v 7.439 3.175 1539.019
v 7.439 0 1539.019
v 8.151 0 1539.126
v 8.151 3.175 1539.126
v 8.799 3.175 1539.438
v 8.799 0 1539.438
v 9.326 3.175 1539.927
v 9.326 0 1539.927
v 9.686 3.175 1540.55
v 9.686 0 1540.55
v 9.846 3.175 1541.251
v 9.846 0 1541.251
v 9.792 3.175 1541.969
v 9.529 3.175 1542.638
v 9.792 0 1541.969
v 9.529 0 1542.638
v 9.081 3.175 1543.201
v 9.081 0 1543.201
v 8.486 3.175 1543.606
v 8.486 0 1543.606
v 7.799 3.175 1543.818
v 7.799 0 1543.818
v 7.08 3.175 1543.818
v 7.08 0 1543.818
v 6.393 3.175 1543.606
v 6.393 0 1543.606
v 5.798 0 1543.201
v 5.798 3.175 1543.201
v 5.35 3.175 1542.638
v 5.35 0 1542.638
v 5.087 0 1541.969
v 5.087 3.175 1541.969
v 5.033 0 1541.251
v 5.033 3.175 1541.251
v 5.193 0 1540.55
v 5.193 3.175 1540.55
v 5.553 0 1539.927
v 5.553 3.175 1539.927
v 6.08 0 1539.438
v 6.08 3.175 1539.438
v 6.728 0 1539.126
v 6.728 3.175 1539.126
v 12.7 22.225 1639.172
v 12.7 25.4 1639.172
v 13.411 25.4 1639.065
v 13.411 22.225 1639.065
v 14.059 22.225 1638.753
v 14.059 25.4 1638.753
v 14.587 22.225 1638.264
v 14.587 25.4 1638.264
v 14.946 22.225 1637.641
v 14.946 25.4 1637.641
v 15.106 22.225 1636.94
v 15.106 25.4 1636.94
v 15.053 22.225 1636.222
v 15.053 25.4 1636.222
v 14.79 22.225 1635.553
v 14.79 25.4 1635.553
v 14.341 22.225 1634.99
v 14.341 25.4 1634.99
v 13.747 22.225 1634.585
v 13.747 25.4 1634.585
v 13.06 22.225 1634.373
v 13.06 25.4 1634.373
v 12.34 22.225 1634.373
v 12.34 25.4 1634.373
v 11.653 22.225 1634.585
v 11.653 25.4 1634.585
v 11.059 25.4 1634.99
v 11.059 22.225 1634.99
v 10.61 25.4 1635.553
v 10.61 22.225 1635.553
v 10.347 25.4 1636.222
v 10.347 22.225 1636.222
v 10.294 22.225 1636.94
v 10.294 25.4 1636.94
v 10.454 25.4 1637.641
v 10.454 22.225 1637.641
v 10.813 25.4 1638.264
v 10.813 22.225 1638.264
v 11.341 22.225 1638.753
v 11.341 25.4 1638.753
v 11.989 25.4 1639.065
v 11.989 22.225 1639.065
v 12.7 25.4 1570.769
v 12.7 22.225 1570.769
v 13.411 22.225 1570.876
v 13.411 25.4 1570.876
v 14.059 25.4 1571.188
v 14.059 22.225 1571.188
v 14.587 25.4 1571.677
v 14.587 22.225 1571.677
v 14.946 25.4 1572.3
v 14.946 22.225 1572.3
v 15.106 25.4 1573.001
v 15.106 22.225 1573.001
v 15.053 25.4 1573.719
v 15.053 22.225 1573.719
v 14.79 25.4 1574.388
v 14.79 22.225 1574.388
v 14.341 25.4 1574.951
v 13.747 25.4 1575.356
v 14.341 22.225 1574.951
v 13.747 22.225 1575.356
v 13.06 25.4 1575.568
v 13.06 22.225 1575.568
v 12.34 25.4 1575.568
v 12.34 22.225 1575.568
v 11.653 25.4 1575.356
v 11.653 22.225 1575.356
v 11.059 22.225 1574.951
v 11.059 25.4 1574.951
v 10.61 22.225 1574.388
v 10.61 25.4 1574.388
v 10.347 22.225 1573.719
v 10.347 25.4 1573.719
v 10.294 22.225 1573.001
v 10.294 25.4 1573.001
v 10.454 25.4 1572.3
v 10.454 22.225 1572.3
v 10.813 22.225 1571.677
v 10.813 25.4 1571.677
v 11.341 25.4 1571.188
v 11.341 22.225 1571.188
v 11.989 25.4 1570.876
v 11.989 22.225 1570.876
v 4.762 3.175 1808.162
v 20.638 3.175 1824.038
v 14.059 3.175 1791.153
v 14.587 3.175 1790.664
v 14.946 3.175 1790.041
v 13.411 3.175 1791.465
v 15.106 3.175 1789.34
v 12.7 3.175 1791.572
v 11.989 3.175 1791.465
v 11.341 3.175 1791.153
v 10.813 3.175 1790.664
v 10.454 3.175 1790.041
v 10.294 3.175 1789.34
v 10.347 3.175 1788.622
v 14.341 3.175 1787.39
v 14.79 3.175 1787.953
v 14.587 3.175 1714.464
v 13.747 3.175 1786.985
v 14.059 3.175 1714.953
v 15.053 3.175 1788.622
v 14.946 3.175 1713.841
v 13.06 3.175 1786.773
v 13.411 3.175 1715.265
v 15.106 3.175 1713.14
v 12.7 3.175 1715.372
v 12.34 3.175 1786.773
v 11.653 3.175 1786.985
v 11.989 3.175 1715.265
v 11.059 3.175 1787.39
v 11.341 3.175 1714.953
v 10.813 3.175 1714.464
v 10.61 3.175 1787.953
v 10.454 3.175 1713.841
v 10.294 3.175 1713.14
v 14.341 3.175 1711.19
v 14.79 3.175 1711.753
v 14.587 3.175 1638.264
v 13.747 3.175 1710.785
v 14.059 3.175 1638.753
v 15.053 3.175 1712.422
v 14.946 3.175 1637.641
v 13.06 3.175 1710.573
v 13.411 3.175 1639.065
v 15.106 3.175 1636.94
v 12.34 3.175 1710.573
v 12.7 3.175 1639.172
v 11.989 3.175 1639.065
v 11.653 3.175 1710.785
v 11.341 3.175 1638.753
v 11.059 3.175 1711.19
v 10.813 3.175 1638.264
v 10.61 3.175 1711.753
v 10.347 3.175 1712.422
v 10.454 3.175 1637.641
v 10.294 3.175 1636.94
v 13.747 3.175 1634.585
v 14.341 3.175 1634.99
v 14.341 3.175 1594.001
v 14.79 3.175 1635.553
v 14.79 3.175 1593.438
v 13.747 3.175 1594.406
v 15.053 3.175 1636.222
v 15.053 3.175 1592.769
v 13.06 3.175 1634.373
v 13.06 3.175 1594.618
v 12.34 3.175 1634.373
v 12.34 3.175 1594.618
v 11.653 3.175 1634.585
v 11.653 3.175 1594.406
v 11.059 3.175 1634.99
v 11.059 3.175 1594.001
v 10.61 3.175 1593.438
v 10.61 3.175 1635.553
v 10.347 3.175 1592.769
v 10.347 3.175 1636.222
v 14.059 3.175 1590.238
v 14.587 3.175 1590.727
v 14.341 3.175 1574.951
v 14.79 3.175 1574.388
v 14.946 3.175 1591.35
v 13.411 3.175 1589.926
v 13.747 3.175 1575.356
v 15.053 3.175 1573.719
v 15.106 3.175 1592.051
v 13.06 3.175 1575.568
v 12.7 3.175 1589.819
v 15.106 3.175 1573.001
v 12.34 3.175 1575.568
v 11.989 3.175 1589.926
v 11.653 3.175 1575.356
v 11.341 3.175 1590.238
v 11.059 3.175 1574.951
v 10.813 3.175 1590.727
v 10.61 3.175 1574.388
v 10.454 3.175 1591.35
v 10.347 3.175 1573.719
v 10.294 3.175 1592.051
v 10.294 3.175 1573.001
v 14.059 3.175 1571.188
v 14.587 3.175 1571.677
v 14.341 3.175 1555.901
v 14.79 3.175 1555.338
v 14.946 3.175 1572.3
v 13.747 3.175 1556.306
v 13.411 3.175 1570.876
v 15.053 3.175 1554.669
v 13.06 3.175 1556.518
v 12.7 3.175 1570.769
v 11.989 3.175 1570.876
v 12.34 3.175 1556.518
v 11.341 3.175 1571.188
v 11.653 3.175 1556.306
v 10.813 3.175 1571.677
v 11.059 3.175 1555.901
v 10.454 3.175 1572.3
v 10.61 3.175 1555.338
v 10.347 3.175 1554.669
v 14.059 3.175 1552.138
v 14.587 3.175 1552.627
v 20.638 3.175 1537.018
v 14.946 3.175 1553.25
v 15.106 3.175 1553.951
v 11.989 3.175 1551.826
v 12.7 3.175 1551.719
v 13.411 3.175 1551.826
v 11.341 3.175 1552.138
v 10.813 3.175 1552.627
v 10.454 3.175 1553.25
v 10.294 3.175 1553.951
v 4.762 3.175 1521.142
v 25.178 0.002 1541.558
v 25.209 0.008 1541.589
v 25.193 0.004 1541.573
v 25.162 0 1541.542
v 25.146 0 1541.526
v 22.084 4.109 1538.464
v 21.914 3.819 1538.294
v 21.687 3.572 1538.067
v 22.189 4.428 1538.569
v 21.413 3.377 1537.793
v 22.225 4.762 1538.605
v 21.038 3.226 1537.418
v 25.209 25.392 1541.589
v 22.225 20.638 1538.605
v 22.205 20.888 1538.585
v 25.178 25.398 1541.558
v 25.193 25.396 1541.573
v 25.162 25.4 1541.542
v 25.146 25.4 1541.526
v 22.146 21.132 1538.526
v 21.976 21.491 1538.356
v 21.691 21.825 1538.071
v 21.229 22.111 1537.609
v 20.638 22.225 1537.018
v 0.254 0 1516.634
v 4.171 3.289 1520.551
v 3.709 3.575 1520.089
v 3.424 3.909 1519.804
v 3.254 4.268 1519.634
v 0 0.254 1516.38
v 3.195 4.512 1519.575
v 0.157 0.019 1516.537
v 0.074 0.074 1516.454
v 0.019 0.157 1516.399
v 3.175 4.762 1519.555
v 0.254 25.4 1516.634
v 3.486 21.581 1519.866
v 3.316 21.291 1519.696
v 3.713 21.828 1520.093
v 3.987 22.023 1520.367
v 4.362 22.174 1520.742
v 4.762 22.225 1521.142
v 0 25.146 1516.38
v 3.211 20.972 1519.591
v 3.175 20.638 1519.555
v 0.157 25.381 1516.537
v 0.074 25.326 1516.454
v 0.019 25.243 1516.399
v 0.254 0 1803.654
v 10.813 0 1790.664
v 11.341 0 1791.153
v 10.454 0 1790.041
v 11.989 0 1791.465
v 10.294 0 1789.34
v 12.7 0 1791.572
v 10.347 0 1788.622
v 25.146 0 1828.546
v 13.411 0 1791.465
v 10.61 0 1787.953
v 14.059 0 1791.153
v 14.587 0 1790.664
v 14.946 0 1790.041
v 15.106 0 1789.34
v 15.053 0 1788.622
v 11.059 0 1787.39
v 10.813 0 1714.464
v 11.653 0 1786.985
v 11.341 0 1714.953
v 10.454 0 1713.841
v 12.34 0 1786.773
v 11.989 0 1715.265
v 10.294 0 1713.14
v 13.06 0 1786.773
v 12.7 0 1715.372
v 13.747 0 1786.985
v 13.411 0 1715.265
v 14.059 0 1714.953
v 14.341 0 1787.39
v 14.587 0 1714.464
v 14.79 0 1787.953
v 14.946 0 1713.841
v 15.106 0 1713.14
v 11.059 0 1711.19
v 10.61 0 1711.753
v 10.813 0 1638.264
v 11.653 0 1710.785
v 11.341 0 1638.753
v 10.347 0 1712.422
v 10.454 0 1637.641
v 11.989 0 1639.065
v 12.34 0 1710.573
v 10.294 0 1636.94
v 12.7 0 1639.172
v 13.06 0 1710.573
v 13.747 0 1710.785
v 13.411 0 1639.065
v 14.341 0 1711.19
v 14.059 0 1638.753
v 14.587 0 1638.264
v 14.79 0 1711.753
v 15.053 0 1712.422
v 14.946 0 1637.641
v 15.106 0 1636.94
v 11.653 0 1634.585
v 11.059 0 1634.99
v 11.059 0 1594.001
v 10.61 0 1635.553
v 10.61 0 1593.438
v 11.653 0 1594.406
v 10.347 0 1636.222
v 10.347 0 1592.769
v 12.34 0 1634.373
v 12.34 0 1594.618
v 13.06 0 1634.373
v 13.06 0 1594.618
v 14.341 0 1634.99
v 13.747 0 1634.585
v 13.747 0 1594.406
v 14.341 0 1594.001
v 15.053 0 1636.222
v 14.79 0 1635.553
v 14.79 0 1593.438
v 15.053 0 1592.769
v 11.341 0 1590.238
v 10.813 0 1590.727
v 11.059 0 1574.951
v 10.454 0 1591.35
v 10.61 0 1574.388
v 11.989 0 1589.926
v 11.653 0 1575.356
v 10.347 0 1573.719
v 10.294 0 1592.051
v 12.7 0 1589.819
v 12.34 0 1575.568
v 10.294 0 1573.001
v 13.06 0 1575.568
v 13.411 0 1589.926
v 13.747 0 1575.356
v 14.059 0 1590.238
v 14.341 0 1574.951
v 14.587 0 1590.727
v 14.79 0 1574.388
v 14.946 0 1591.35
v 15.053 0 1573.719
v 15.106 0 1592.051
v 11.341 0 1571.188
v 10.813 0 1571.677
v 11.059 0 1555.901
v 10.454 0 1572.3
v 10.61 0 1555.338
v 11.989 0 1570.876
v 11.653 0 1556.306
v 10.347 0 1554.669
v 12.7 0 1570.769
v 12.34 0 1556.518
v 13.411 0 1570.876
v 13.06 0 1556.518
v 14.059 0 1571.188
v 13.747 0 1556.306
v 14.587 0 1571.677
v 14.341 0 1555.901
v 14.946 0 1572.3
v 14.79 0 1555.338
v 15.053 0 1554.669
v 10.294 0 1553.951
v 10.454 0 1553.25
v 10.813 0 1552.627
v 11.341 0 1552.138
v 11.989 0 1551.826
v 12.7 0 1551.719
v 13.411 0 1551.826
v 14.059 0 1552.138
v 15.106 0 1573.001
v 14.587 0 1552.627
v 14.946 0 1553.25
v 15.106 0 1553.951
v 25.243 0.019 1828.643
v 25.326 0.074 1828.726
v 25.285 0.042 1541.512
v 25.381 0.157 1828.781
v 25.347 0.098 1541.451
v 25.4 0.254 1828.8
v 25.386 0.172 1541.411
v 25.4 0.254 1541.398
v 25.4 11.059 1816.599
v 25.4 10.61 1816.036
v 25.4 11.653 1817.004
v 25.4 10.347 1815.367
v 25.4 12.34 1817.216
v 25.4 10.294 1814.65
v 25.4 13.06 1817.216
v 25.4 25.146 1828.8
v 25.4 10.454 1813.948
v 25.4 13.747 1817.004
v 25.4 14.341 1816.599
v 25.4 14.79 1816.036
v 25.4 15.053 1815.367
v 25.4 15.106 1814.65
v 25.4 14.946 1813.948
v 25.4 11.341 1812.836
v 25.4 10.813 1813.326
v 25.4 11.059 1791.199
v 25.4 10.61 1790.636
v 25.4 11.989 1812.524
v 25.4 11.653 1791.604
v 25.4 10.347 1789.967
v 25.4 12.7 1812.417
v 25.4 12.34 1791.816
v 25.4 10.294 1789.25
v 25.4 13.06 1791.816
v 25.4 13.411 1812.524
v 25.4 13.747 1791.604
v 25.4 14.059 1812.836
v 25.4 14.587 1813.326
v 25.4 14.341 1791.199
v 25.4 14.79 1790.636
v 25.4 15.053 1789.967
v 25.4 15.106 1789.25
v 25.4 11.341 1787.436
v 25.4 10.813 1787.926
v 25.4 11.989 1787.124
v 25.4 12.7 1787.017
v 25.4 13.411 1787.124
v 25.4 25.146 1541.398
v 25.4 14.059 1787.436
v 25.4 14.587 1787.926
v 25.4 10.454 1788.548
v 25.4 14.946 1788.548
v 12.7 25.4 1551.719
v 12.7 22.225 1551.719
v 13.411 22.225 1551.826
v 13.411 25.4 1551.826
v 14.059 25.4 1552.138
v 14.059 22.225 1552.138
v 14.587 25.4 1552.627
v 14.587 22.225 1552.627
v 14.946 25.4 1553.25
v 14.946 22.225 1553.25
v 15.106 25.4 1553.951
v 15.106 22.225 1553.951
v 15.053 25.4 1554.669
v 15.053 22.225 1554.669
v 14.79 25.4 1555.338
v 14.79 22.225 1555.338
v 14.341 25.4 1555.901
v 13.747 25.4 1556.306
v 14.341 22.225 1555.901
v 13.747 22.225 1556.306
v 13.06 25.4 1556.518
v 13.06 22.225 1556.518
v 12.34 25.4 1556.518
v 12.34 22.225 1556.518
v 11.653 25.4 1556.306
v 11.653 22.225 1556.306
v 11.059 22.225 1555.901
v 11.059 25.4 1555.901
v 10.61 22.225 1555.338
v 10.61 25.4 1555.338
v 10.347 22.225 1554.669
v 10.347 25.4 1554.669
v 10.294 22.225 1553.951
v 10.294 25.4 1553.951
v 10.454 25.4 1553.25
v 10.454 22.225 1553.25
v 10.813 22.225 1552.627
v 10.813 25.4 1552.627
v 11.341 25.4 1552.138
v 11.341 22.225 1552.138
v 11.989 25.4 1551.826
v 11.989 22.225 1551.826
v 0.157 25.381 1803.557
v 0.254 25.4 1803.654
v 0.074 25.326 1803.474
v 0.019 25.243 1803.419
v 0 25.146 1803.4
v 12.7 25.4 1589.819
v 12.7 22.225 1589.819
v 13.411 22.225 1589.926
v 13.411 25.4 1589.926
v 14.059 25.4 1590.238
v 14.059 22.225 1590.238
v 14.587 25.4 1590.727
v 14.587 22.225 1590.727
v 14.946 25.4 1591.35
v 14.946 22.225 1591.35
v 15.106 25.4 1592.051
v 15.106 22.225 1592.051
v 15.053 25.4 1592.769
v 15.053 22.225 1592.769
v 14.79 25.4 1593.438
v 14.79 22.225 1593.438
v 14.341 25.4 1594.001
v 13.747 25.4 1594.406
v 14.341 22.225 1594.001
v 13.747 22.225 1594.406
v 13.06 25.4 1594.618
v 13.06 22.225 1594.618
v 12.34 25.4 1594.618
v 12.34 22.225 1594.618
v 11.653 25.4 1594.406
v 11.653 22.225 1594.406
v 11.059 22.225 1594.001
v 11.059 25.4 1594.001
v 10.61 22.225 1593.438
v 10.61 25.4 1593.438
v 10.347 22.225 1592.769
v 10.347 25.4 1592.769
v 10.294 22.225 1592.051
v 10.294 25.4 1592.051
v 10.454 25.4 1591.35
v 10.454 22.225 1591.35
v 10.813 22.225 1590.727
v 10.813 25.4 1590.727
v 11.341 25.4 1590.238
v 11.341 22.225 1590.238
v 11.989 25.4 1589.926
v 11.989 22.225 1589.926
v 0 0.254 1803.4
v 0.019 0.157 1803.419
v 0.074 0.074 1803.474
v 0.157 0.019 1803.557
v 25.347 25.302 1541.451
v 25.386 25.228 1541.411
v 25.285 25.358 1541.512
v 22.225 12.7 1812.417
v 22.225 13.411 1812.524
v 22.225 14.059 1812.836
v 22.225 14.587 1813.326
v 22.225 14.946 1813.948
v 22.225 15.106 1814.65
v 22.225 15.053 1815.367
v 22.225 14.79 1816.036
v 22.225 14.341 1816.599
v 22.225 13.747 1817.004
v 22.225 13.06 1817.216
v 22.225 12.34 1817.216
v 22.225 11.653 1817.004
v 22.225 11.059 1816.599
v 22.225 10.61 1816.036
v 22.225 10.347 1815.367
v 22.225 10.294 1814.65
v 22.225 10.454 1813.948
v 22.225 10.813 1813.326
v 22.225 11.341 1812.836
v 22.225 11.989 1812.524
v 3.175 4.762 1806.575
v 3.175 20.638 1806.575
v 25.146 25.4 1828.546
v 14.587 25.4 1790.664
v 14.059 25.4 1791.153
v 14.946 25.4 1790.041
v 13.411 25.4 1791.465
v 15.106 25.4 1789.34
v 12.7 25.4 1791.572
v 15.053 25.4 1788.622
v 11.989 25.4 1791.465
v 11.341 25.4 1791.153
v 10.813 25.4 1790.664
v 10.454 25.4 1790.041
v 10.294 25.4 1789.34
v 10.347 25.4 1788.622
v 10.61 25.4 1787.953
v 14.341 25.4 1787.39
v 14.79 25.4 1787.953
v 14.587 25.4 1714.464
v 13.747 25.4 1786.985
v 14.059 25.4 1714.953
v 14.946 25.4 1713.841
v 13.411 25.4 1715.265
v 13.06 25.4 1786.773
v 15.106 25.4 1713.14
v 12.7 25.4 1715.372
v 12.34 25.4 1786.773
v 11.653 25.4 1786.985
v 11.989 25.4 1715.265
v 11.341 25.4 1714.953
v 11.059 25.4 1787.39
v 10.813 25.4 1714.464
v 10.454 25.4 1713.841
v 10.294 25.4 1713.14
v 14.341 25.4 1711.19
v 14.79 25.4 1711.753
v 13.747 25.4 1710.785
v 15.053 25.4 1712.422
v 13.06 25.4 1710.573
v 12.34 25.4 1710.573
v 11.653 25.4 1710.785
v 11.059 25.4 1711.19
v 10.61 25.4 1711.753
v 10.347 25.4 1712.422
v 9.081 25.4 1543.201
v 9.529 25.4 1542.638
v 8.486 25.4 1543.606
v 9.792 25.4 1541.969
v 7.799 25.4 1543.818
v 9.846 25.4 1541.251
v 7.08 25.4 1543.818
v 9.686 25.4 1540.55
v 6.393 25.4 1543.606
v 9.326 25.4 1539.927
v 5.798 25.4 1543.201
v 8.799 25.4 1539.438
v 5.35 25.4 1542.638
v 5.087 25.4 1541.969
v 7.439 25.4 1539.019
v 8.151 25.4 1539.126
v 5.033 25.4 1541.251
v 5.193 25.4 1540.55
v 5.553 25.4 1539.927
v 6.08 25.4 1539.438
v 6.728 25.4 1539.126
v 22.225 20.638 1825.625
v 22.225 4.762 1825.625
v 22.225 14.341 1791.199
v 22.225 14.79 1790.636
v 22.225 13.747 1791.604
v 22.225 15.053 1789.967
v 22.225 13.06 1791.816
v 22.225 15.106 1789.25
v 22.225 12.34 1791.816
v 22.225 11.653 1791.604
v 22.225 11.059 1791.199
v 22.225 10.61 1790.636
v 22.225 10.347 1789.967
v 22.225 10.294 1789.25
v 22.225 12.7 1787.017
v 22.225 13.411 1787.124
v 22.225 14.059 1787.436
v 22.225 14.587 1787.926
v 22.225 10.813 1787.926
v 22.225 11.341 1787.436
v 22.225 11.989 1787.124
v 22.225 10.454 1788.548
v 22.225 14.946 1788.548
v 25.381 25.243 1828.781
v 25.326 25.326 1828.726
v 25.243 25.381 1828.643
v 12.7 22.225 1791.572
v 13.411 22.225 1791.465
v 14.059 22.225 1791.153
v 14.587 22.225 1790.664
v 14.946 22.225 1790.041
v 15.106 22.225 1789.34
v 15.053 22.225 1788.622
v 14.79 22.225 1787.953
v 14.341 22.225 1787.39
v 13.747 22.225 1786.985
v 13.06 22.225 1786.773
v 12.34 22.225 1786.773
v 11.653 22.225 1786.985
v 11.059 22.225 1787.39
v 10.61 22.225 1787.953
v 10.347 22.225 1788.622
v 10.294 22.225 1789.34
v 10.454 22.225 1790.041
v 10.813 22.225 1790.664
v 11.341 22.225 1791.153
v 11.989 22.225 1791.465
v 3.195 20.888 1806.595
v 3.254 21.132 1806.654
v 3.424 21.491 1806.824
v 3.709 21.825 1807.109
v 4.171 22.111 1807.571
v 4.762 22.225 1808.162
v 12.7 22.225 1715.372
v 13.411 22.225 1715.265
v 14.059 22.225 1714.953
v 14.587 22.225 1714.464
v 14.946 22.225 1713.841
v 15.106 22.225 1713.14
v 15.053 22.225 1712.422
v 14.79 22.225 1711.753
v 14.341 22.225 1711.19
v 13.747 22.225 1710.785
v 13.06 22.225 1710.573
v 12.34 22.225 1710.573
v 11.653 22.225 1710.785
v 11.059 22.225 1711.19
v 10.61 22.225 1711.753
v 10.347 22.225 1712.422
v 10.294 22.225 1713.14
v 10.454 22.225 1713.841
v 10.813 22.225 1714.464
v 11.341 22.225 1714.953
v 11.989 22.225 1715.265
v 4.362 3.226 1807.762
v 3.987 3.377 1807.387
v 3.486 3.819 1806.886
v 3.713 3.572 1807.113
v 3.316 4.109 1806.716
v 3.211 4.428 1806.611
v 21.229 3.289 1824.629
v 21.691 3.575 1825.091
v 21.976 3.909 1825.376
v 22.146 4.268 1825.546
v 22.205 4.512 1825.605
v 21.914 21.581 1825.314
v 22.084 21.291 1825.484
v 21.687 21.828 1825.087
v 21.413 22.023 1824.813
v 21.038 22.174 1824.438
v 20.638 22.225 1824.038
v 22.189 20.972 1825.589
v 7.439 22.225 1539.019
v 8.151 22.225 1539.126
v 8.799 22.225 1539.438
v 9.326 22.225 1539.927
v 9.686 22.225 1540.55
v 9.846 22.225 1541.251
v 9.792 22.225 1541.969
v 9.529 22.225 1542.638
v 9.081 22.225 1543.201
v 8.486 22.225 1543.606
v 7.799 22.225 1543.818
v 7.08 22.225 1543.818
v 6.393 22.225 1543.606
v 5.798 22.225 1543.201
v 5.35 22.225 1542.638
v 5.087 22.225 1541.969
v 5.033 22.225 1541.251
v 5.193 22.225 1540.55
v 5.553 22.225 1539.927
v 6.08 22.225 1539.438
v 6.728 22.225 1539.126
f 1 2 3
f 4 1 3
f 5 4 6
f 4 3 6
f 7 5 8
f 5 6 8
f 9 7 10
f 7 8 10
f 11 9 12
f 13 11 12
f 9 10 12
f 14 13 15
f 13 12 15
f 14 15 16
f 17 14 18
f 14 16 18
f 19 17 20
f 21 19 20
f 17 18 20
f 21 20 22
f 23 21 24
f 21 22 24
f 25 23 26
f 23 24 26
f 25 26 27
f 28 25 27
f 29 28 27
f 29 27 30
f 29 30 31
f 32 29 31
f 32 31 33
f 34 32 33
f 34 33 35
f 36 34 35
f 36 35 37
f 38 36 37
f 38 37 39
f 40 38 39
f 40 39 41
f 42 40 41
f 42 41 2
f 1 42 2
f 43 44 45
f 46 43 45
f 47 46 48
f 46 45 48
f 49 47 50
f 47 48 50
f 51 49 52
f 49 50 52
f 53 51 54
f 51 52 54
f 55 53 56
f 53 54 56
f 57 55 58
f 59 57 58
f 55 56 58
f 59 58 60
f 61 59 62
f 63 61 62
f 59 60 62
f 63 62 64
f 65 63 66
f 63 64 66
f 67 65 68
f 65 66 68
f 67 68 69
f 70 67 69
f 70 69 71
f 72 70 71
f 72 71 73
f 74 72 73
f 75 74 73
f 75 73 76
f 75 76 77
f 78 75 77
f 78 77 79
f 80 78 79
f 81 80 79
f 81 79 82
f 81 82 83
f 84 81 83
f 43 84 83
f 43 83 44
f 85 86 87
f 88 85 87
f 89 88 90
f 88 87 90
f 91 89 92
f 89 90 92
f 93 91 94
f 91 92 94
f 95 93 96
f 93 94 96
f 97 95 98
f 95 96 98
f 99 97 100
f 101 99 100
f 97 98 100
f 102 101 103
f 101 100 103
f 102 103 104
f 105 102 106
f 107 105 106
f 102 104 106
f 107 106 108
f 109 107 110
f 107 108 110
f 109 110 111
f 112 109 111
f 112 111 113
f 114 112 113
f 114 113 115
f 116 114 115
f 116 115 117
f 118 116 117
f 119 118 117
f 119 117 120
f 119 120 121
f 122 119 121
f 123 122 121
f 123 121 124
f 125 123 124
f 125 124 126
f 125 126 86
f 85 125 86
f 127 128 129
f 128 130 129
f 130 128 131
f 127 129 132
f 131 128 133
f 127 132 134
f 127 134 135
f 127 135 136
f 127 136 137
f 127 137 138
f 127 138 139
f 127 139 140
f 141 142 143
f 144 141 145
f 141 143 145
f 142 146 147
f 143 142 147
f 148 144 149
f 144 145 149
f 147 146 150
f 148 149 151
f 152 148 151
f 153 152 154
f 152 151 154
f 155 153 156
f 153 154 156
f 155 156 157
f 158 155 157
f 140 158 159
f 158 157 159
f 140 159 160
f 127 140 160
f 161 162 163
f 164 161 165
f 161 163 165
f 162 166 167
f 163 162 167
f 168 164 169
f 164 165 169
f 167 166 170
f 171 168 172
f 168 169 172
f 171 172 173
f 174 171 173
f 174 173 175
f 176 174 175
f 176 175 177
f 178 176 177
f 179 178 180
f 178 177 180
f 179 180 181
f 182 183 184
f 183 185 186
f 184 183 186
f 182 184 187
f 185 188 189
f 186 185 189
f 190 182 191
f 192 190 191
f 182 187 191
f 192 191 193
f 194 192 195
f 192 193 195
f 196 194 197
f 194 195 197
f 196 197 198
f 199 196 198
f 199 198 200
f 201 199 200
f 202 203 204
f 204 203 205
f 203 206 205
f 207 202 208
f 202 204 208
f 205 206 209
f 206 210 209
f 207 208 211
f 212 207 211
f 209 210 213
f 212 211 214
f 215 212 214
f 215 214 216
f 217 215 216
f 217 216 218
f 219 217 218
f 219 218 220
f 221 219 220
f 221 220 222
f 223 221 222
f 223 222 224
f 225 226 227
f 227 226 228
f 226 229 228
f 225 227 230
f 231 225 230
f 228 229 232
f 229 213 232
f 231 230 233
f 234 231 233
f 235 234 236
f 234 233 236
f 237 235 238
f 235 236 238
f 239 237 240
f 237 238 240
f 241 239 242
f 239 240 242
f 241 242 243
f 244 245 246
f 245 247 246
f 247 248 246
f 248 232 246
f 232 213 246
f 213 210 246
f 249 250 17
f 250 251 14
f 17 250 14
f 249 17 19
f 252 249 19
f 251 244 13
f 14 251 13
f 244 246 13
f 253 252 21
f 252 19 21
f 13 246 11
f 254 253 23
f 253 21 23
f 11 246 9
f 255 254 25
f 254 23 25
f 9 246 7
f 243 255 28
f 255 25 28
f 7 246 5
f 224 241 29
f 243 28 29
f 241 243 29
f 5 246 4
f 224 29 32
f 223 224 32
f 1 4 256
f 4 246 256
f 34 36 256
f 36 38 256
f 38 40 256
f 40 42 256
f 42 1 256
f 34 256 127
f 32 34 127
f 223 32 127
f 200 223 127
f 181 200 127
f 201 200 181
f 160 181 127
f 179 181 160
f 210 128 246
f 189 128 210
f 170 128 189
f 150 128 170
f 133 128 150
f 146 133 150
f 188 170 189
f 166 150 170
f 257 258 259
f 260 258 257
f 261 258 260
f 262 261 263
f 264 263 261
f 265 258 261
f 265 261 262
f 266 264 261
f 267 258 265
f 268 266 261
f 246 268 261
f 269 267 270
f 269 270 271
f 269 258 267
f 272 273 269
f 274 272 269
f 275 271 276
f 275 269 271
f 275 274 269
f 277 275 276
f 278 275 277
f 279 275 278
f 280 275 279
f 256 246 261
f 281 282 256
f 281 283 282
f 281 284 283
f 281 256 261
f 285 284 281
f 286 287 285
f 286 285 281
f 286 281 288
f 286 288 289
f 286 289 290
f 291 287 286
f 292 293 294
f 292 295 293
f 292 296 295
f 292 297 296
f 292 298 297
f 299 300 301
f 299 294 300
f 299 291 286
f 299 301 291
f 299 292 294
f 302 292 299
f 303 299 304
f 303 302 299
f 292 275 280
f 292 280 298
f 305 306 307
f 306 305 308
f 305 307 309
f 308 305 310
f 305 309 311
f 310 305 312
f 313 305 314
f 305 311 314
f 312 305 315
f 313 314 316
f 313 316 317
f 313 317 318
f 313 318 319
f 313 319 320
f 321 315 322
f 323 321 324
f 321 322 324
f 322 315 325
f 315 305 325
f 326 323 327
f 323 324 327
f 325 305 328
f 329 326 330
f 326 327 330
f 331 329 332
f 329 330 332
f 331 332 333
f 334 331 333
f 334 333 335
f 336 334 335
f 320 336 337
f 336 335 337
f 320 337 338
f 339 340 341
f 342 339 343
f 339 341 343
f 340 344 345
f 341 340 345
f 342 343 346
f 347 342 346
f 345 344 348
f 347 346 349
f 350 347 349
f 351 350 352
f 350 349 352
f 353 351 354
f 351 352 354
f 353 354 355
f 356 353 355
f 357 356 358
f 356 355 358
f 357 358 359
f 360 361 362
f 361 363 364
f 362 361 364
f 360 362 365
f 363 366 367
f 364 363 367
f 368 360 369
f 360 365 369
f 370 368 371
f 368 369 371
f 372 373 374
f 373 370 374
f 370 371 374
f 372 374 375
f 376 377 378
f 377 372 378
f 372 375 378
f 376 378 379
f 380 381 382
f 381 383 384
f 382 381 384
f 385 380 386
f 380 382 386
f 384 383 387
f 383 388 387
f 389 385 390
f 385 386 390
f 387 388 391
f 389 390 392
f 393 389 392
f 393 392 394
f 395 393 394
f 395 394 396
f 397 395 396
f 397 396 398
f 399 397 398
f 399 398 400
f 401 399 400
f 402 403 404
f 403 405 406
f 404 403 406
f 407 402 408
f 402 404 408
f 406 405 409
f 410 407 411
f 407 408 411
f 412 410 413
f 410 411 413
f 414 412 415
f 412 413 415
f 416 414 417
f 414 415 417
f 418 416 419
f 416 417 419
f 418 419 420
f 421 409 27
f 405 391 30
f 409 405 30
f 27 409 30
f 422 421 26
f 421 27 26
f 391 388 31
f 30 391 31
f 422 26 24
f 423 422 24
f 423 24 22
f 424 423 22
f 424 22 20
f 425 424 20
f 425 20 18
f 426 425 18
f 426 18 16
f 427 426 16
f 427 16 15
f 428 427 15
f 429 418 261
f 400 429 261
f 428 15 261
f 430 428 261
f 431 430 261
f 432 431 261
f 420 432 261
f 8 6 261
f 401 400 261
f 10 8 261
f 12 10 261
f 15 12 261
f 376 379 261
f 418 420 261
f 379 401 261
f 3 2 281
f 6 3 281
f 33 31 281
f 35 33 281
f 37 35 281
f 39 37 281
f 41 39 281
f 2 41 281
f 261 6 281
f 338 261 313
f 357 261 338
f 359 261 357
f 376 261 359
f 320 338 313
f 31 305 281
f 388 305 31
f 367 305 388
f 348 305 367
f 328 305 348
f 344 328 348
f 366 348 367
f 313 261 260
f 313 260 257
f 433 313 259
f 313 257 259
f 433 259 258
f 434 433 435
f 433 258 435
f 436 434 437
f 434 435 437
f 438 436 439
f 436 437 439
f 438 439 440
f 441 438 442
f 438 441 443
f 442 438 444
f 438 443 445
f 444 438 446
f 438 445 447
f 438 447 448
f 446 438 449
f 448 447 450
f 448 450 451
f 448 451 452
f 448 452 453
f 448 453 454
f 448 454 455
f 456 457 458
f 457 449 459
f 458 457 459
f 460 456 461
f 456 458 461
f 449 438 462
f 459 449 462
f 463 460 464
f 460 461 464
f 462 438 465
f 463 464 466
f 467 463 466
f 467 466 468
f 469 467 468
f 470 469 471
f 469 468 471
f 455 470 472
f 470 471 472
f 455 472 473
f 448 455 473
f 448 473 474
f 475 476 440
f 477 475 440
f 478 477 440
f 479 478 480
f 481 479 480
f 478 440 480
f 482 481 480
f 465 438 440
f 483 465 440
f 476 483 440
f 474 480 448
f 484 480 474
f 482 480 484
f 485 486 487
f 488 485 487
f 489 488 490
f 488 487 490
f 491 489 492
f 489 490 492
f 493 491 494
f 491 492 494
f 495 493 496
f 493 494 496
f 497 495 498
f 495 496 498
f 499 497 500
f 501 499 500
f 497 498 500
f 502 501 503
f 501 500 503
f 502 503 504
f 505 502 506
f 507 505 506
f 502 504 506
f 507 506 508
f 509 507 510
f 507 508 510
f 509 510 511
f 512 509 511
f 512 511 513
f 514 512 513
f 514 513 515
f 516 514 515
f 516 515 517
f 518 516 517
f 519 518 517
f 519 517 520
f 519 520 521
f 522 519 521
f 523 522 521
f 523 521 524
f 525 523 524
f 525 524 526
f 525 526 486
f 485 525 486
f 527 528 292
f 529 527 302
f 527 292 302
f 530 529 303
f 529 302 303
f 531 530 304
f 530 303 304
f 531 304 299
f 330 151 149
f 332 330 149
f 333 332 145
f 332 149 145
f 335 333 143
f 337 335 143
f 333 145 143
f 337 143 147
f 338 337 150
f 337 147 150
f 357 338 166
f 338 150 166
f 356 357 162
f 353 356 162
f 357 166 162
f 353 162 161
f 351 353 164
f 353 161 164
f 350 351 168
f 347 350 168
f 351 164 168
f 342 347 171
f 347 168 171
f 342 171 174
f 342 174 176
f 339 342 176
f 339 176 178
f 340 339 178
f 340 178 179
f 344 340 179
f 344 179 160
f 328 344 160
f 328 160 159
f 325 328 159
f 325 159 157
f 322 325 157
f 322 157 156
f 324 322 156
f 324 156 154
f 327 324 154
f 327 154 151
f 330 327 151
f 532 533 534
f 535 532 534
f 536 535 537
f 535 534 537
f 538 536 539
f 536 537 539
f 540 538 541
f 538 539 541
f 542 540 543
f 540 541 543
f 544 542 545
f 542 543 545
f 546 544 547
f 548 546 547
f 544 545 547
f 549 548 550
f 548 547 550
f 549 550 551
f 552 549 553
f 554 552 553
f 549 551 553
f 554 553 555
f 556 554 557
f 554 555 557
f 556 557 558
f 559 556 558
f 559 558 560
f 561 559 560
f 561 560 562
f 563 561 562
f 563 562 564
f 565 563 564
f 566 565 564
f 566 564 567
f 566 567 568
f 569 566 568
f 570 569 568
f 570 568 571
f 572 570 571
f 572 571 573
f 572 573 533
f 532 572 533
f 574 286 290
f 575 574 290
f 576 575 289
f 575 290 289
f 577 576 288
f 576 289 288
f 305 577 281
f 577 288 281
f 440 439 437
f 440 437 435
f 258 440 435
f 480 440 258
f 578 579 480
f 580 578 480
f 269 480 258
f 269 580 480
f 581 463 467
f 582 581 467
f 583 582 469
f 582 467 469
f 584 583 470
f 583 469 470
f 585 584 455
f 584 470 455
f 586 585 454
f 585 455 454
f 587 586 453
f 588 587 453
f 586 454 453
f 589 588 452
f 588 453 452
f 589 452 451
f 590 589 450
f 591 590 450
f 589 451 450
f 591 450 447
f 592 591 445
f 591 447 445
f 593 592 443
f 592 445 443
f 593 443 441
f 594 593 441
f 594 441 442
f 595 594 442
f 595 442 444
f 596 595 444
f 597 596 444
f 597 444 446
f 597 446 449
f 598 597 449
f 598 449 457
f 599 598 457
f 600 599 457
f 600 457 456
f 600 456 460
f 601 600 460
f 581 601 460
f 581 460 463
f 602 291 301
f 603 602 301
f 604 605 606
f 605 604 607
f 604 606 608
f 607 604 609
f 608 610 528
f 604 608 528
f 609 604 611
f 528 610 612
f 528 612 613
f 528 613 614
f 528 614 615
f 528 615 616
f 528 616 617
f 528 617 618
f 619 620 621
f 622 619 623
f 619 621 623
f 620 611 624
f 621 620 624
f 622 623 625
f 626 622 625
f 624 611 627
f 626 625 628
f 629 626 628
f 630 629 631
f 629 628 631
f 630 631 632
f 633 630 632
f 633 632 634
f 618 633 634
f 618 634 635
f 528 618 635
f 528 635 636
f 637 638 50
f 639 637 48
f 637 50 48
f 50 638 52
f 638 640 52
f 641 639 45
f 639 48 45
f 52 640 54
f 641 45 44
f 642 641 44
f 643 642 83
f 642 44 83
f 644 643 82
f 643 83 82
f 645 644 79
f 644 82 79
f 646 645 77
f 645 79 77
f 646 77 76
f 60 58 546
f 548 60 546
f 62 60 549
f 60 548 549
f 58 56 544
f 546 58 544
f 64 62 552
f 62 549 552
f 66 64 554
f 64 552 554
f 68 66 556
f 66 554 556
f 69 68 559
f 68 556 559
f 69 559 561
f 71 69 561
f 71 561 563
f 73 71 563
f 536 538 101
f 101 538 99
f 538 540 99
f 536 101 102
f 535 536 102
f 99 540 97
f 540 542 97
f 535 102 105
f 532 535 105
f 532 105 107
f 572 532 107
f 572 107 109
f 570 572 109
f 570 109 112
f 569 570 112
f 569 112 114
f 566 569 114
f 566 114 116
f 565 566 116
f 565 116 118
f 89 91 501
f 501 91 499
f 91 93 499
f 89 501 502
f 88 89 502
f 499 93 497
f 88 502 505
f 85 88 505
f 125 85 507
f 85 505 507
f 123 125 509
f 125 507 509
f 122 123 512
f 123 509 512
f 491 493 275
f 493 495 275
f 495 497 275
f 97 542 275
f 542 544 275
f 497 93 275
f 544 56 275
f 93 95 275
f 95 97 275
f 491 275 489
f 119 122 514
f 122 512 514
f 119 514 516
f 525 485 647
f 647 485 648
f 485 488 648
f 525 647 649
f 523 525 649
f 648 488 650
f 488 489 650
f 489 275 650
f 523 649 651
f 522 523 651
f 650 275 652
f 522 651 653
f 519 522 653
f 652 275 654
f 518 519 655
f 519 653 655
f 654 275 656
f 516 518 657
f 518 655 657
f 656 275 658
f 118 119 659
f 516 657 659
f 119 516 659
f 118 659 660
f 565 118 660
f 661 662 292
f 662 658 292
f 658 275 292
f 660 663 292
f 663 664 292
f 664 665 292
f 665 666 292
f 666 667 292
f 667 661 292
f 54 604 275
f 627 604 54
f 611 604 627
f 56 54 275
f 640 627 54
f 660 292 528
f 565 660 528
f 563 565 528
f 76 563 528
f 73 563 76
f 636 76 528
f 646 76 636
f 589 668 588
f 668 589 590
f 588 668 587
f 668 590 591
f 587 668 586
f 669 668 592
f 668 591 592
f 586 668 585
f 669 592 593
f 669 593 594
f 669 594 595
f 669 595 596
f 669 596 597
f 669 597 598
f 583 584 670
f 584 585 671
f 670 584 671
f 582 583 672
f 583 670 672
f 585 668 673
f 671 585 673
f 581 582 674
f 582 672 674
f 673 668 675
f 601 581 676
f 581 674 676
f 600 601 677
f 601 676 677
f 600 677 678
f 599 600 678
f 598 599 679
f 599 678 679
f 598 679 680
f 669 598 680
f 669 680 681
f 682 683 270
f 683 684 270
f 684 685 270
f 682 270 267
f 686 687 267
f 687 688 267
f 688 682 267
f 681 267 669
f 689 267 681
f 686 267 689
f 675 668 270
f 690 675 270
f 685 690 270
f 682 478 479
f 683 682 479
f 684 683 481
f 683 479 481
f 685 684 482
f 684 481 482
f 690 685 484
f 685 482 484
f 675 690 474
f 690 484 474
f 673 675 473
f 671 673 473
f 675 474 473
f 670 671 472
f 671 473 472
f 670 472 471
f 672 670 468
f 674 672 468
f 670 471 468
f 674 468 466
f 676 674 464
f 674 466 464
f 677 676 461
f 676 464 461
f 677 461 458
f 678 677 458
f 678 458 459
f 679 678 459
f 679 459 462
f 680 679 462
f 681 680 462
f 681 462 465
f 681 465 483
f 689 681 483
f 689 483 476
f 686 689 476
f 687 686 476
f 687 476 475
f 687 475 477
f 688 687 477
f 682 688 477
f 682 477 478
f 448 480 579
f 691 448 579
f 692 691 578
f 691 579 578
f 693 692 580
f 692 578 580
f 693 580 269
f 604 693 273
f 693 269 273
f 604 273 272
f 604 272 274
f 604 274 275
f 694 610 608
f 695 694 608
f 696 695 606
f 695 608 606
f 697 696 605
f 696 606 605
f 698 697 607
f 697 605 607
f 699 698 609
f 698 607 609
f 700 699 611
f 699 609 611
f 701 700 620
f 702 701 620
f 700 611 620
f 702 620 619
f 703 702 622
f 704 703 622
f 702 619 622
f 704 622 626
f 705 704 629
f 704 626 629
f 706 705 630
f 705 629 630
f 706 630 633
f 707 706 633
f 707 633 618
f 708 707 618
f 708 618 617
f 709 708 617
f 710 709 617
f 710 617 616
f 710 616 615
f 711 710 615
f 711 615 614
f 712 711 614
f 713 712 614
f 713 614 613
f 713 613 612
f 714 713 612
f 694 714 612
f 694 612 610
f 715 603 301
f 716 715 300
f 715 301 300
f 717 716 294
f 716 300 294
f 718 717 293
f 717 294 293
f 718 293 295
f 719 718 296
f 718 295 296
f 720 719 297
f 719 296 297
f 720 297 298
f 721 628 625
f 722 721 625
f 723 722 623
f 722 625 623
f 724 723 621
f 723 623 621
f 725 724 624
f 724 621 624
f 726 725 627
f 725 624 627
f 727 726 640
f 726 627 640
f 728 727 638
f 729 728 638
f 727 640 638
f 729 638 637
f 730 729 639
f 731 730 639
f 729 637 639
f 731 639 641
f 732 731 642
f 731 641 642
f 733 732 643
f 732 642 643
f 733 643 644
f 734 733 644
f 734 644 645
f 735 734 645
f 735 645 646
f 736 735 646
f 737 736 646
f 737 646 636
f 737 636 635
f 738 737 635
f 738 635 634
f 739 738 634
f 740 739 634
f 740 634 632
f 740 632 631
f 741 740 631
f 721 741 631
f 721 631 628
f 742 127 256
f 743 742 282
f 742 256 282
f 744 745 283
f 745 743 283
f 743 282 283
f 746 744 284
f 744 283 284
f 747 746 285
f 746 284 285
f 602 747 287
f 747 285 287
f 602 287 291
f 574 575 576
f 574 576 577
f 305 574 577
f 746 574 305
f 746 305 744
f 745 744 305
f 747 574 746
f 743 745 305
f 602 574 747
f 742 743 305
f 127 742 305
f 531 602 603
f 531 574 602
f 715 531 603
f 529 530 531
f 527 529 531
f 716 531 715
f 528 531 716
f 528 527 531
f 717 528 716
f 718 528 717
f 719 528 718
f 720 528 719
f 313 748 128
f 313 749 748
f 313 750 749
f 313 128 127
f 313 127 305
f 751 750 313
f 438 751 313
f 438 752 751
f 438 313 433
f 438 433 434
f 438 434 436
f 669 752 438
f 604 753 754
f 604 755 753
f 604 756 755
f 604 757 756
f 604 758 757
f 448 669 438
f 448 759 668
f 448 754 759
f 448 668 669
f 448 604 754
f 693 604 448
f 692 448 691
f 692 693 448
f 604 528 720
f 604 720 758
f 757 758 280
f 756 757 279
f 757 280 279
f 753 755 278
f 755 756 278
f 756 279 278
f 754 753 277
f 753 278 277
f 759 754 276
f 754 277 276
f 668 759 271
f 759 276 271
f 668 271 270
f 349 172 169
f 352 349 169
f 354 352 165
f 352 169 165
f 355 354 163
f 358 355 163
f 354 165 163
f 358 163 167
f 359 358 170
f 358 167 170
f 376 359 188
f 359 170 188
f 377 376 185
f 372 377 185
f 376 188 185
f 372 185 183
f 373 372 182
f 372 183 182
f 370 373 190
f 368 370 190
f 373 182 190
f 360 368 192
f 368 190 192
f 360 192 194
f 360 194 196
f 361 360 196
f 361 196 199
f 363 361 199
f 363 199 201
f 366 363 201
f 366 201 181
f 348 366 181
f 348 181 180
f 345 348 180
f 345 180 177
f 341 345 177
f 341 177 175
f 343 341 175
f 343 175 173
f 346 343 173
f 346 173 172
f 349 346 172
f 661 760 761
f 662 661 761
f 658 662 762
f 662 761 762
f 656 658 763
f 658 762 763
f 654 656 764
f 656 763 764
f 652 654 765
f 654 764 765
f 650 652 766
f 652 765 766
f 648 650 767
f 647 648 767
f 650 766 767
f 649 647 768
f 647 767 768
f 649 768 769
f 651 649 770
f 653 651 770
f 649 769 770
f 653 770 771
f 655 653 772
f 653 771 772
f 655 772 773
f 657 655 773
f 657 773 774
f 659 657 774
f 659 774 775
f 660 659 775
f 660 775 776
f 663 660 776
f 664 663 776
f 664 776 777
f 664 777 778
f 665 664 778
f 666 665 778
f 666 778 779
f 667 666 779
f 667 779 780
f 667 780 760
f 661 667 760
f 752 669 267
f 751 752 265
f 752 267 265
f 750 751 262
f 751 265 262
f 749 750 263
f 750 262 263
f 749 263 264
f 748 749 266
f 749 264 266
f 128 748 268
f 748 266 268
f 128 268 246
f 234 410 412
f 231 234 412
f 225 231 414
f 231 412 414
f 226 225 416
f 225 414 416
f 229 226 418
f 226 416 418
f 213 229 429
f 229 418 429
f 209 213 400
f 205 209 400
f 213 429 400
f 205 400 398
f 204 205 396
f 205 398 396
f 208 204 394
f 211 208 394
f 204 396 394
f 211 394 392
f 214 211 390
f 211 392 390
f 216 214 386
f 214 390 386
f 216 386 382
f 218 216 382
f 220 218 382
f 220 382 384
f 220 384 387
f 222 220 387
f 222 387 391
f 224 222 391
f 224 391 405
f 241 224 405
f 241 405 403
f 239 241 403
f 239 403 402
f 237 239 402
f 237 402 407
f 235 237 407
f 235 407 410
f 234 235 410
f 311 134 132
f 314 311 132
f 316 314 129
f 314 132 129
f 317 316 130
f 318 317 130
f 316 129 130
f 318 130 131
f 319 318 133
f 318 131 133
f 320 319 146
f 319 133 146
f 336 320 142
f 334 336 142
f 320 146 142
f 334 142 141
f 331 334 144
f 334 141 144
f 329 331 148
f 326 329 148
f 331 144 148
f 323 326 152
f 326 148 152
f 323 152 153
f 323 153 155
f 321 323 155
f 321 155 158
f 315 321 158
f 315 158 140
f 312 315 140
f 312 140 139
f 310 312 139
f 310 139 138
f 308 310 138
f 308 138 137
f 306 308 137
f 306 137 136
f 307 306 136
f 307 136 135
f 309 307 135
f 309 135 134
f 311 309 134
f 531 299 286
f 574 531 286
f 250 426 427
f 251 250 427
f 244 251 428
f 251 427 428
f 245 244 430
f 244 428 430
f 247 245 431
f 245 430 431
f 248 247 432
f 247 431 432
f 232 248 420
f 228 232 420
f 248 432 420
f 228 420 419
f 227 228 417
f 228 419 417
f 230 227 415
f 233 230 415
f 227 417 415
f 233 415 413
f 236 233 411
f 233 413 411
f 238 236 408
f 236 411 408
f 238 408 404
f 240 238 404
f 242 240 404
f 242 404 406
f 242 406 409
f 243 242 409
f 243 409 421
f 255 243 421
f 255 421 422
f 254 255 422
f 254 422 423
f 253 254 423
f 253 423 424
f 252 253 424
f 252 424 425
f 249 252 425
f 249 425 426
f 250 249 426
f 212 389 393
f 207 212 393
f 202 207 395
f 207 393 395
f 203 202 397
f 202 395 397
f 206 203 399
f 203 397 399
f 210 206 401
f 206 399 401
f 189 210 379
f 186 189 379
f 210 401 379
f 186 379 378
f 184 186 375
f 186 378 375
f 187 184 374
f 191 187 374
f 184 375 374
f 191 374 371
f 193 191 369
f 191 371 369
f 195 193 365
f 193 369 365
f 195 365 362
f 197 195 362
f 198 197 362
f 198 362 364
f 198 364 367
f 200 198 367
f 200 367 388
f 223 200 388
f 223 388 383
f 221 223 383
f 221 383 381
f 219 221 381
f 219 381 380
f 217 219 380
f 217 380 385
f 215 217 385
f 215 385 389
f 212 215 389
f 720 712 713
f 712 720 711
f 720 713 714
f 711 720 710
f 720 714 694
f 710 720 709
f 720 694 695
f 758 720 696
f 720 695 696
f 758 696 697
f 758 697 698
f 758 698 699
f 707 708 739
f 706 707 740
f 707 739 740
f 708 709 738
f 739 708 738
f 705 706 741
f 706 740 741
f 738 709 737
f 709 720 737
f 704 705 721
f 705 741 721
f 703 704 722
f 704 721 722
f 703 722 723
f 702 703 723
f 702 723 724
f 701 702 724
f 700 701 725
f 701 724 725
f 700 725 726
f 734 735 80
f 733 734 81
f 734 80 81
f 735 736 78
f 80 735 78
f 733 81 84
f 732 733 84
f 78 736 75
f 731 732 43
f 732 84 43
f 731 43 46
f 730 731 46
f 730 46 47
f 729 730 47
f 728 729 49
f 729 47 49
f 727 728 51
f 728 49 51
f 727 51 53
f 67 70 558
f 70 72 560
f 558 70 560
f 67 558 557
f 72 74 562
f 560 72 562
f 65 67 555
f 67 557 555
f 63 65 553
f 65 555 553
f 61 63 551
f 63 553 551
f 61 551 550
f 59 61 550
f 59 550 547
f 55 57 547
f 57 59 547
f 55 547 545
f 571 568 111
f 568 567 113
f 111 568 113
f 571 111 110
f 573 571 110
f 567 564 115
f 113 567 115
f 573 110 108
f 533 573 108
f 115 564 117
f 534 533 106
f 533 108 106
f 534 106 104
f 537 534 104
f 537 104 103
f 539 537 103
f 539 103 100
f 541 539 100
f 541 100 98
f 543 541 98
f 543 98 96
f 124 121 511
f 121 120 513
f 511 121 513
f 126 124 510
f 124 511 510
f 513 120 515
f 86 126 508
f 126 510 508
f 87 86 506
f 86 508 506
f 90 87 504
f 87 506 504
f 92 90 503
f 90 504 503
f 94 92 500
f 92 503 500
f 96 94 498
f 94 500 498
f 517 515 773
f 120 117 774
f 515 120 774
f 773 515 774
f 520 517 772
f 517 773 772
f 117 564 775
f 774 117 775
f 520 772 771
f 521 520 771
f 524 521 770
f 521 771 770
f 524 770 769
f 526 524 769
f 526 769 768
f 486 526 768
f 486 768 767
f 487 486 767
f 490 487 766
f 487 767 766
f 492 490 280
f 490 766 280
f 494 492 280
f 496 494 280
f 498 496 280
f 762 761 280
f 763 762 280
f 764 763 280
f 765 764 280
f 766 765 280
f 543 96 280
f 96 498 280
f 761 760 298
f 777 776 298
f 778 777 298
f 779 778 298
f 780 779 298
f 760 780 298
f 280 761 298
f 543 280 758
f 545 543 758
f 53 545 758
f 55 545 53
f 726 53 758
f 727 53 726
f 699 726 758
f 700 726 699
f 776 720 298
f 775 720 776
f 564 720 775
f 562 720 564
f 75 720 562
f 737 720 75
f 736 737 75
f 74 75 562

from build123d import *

# Parameters (mm, degrees)
CUT_EXTRUDE1_START = 1516.38
CUT_EXTRUDE1_DEPTH = 312.42
CUT_EXTRUDE2_REACH = 1831.153
CUT_EXTRUDE3_REACH = 1831.153
SKETCH4_R          = 2.413
CUT_EXTRUDE4_DEPTH = 1830.152743759
SKETCH5_R          = 2.413
CUT_EXTRUDE5_DEPTH = 1830.152743759
CUT_EXTRUDE7_REACH = 1831.153
SKETCH8_R          = 2.413


with BuildPart() as part:
    # Cut-Extrude1: read off the stored shape, not the designer's step
    # Cut-Extrude1 outline → Cut-Extrude1 (new body)
    with BuildSketch(Plane.XY.offset(CUT_EXTRUDE1_START)):
        with BuildLine():
            Line((0, 25.146), (0, 0.254))
            ThreePointArc((0, 0.254), (0.074394878, 0.074394878), (0.254, 0))
            Line((0.254, 0), (25.146, 0))
            ThreePointArc((25.146, 0), (25.325605122, 0.074394878), (25.4, 0.254))
            Line((25.4, 0.254), (25.4, 25.146))
            ThreePointArc((25.4, 25.146), (25.325605122, 25.325605122), (25.146, 25.4))
            Line((25.146, 25.4), (0.254, 25.4))
            ThreePointArc((0.254, 25.4), (0.074394878, 25.325605122), (0, 25.146))
        make_face()
        with BuildLine():
            ThreePointArc((4.7625, 3.175), (3.639967985, 3.639967985), (3.175, 4.7625))
            Line((3.175, 4.7625), (3.175, 20.6375))
            ThreePointArc((3.175, 20.6375), (3.639967985, 21.760032015), (4.7625, 22.225))
            Line((4.7625, 22.225), (20.6375, 22.225))
            ThreePointArc((20.6375, 22.225), (21.760032015, 21.760032015), (22.225, 20.6375))
            Line((22.225, 20.6375), (22.225, 4.7625))
            ThreePointArc((22.225, 4.7625), (21.760032015, 3.639967985), (20.6375, 3.175))
            Line((20.6375, 3.175), (4.7625, 3.175))
        make_face(mode=Mode.SUBTRACT)
    extrude(amount=CUT_EXTRUDE1_DEPTH)

    # Cut-Extrude2: up to this face of the body (flat: up to its plane)
    cut_extrude2_end = Plane(part.part.faces().sort_by_distance((12.7, 0, 1672.59))[0])
    # Sketch2 → Cut-Extrude2 (cut, up to the picked face)
    with BuildSketch(Plane(origin=(0, 25.4, 0), x_dir=(1, 0, 0), z_dir=(0, 1, 0)), mode=Mode.PRIVATE) as cut_extrude2_sk1:
        Polygon((43.169380192, -1523.628355708), (25.20886795, -1541.58886795), (-10.712156534, -1505.667843466), (7.248355708, -1487.707331224), align=None)
    cut_extrude2_tool1 = split(extrude(cut_extrude2_sk1.sketch, amount=-CUT_EXTRUDE2_REACH, mode=Mode.PRIVATE), bisect_by=cut_extrude2_end, keep=Keep.BOTH, mode=Mode.PRIVATE)
    add(cut_extrude2_tool1.solids().sort_by(Axis((16.228612, 25.4, 1514.6481), (0, -1, 0)))[0], mode=Mode.SUBTRACT)

    # Cut-Extrude3: up to this face of the body (flat: up to its plane)
    cut_extrude3_end = Plane(part.part.faces().sort_by_distance((12.527724859, 0, 1678.853862429))[0])
    # Sketch3 → Cut-Extrude3 (cut, up to the picked face)
    with BuildSketch(Plane(origin=(0, 25.4, 0), x_dir=(1, 0, 0), z_dir=(0, 1, 0)), mode=Mode.PRIVATE) as cut_extrude3_sk1:
        Polygon((34.192766306, -1837.592766306), (16.232254064, -1855.553278548), (-19.688770421, -1819.632254064), (-1.728258178, -1801.671741822), align=None)
    cut_extrude3_tool1 = split(extrude(cut_extrude3_sk1.sketch, amount=-CUT_EXTRUDE3_REACH, mode=Mode.PRIVATE), bisect_by=cut_extrude3_end, keep=Keep.BOTH, mode=Mode.PRIVATE)
    add(cut_extrude3_tool1.solids().sort_by(Axis((7.251998, 25.4, 1828.61251), (0, -1, 0)))[0], mode=Mode.SUBTRACT)

    # Sketch4 → Cut-Extrude4 (cut, through all)
    with BuildSketch(Plane(origin=(0, 25.4, 0), x_dir=(1, 0, 0), z_dir=(0, 1, 0))):
        with Locations(Location((12.7, -1789.159231637, 0), (0, 0, 270))):
            Circle(SKETCH4_R)
        with Locations(Location((12.7, -1712.959231637, 0), (0, 0, 270))):
            Circle(SKETCH4_R)
        with Locations(Location((12.7, -1636.759231637, 0), (0, 0, 270))):
            Circle(SKETCH4_R)
    extrude(amount=-CUT_EXTRUDE4_DEPTH, mode=Mode.SUBTRACT)

    # Sketch5 → Cut-Extrude5 (cut, through all)
    with BuildSketch(Plane.XZ):
        with Locations(Location((7.439487758, 1541.431804126, 0), (0, 0, 270))):
            Circle(SKETCH5_R)
        with Locations(Location((12.7, 1554.131804126, 0), (0, 0, 270))):
            Circle(SKETCH5_R)
        with Locations(Location((12.7, 1573.181804126, 0), (0, 0, 270))):
            Circle(SKETCH5_R)
        with Locations(Location((12.7, 1592.231804126, 0), (0, 0, 270))):
            Circle(SKETCH5_R)
    extrude(amount=-CUT_EXTRUDE5_DEPTH, mode=Mode.SUBTRACT)

    # Sketch8 → Cut-Extrude7 (cut, up to next)
    with BuildSketch(Plane(origin=(25.4, 0, 0), x_dir=(0, 0, -1), z_dir=(1, 0, 0)), mode=Mode.PRIVATE) as cut_extrude7_sk1:
        with Locations((-1814.83, 12.7)):
            Circle(SKETCH8_R)
    cut_extrude7_tool1 = extrude(cut_extrude7_sk1.sketch, amount=-CUT_EXTRUDE7_REACH, mode=Mode.PRIVATE) & part.part
    # Sketch8 → Cut-Extrude7 (cut, up to next)
    with BuildSketch(Plane(origin=(25.4, 0, 0), x_dir=(0, 0, -1), z_dir=(1, 0, 0)), mode=Mode.PRIVATE) as cut_extrude7_sk2:
        with Locations((-1789.43, 12.7)):
            Circle(SKETCH8_R)
    cut_extrude7_tool2 = extrude(cut_extrude7_sk2.sketch, amount=-CUT_EXTRUDE7_REACH, mode=Mode.PRIVATE) & part.part
    add(cut_extrude7_tool1.solids().sort_by_distance((25.4, 12.7, 1814.83))[0], mode=Mode.SUBTRACT)
    add(cut_extrude7_tool2.solids().sort_by_distance((25.4, 12.7, 1789.43))[0], mode=Mode.SUBTRACT)


solid = part.part
